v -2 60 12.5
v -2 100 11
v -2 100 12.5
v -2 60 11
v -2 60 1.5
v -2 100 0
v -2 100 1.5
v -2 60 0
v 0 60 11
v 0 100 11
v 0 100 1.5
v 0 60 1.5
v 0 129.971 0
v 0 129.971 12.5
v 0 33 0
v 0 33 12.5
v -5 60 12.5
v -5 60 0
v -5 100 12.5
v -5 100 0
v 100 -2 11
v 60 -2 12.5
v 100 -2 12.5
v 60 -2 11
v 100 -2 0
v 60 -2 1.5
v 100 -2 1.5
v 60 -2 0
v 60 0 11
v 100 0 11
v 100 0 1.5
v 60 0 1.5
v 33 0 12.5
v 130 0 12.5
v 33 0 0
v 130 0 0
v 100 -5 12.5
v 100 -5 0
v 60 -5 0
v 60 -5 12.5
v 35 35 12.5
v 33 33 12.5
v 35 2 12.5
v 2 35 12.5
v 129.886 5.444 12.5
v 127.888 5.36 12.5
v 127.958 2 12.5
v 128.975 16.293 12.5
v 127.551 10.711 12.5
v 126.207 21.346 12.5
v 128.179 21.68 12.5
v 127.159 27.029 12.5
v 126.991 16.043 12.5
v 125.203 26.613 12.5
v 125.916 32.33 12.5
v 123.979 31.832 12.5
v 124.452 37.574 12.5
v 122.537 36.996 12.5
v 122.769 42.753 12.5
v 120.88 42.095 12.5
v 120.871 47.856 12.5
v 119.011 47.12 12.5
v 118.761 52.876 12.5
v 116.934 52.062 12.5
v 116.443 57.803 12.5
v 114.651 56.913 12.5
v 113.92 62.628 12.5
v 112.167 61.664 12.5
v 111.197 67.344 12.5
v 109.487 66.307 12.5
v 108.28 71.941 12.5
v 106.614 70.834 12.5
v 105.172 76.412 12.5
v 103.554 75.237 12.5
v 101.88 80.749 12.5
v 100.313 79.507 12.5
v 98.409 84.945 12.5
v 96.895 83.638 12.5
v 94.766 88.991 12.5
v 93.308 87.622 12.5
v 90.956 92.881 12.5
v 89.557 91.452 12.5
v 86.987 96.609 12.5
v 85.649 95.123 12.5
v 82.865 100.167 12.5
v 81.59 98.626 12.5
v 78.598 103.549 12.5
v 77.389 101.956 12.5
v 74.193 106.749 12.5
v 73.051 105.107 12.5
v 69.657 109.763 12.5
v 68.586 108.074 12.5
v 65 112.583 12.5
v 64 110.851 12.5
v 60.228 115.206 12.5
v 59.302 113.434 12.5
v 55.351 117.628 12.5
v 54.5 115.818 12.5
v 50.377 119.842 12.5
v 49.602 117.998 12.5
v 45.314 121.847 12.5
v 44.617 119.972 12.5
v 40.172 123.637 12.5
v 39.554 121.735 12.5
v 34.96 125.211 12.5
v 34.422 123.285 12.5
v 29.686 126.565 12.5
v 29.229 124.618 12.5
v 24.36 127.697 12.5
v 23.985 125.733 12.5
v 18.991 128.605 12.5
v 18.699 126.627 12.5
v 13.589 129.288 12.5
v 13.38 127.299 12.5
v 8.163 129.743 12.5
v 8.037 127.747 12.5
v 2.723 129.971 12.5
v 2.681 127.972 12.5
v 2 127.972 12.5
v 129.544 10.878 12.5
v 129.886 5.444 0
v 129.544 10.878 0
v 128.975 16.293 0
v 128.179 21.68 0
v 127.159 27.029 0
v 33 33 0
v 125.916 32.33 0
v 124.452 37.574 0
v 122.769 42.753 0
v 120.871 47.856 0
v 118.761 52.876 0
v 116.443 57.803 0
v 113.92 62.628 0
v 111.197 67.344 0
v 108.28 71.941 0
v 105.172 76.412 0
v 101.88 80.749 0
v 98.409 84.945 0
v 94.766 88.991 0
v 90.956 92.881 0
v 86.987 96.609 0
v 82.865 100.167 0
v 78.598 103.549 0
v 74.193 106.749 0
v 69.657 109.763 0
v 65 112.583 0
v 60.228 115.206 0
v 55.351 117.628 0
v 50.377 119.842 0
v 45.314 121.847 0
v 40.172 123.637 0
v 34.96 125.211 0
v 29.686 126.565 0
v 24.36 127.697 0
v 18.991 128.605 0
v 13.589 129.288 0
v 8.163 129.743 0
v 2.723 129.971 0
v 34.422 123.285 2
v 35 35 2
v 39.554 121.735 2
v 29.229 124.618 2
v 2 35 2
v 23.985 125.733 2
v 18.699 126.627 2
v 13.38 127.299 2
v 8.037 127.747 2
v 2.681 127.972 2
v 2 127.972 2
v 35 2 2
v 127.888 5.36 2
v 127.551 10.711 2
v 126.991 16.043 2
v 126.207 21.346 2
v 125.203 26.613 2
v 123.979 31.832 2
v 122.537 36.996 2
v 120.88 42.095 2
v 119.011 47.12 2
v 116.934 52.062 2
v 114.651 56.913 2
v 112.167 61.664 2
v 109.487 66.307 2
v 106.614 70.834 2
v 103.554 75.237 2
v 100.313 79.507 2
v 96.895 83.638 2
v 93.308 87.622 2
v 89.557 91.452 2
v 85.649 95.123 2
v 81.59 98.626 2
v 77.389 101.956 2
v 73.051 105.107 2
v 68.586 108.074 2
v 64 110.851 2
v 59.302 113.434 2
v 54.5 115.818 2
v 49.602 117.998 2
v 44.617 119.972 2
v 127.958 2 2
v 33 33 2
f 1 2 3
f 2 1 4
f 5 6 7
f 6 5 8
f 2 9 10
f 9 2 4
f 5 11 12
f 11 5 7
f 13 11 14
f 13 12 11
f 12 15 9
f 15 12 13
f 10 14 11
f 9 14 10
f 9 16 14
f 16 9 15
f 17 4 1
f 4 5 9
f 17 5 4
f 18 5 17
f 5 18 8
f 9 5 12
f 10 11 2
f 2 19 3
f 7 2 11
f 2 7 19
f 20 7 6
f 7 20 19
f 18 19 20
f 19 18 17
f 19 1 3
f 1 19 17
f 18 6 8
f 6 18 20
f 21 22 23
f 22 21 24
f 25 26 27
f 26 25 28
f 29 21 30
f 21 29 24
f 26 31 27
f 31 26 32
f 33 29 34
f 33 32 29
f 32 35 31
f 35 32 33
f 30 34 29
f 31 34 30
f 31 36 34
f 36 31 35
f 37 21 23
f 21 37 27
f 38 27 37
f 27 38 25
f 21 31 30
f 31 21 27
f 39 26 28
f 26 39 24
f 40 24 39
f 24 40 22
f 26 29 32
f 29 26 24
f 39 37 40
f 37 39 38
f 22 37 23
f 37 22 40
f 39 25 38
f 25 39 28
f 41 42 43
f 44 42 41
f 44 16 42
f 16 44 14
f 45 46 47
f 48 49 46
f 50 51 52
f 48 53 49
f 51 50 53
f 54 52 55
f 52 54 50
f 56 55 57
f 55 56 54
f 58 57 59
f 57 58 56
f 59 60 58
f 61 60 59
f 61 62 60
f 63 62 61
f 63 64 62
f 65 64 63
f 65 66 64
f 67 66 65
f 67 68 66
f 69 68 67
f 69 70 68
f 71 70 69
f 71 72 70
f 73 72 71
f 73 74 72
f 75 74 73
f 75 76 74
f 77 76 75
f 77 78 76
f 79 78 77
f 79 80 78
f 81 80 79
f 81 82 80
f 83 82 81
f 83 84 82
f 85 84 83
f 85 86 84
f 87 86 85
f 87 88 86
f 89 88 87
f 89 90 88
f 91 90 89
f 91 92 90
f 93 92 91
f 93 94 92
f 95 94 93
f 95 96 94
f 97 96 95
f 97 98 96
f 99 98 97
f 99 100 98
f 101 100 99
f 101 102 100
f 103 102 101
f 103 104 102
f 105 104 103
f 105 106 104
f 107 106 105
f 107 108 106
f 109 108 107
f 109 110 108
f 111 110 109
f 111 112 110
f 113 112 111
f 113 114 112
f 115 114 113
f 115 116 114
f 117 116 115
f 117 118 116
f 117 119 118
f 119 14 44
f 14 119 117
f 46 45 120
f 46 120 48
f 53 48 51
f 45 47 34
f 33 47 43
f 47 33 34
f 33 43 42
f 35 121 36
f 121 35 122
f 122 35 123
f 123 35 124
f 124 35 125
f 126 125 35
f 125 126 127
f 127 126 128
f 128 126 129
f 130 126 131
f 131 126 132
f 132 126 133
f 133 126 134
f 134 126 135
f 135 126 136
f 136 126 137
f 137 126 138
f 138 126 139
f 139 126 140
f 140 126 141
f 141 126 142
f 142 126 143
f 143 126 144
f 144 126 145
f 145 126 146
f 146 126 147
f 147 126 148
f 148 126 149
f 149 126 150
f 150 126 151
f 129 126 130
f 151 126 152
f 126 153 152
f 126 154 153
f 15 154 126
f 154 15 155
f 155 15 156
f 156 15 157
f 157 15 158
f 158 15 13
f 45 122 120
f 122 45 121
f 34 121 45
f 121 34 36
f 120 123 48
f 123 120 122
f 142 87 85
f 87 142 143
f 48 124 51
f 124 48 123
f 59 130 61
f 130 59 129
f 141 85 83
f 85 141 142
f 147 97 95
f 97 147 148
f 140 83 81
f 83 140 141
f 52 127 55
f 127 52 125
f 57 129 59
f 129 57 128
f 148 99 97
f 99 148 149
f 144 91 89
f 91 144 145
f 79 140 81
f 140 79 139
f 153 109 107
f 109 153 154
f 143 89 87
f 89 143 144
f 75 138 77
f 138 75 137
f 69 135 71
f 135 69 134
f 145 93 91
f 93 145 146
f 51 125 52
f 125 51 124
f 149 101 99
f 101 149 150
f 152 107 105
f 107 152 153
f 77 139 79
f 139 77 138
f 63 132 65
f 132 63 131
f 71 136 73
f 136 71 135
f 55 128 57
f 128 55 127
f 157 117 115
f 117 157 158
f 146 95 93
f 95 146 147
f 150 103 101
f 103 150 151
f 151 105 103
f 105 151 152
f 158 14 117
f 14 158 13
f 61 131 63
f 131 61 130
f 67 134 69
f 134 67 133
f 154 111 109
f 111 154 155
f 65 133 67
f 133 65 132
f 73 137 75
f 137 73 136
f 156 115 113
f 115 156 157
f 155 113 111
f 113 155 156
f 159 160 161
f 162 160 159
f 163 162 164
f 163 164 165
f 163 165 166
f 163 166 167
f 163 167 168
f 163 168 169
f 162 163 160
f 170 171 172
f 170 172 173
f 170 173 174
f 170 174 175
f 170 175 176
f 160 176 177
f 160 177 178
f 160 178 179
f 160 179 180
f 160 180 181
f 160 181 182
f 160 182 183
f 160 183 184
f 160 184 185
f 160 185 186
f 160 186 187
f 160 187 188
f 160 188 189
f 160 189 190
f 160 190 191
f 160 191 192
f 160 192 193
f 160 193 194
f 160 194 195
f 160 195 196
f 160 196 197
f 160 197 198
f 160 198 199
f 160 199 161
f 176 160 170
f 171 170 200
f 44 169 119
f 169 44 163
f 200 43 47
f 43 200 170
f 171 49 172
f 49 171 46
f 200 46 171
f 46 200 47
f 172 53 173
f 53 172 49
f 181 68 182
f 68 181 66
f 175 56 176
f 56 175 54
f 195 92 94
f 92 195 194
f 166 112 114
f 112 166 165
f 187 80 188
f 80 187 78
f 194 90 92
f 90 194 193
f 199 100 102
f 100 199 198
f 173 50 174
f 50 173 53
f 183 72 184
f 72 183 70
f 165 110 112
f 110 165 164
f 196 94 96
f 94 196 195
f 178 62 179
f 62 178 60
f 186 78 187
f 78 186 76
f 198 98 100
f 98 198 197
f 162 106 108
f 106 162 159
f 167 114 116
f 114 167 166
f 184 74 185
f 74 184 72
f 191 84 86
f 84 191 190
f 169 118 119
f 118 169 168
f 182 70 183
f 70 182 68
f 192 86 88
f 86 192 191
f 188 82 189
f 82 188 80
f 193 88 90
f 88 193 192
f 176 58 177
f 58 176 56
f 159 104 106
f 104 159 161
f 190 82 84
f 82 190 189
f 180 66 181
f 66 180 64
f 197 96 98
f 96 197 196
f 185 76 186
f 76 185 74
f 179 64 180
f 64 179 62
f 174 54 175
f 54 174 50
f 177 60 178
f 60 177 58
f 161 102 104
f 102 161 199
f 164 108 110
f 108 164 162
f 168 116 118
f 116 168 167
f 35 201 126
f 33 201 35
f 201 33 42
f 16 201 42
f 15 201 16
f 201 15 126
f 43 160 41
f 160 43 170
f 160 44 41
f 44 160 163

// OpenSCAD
// file: bezier.scad
module line(p1,p2,w) {
    hull() {
        translate(p1) circle(r=w);
        translate(p2) circle(r=w);
    }
}
module polyline(points, index, w) {
    if(index < len(points)) {
        line(points[index - 1], points[index],w);
        polyline(points, index + 1, w);
    }
}

function choose(n, k)=
     k == 0? 1
    : (n * choose(n - 1, k - 1)) / k;

function _point_on_bezier_rec(points,t,i,c)=
    len(points) == i ? c
    : _point_on_bezier_rec(points,t,i+1,c+choose(len(points)-1,i) * pow(t,i) * pow(1-t,len(points)-i-1) * points[i]);

function _point_on_bezier(points,t)=
    _point_on_bezier_rec(points,t,0,[0,0]);

//a bezier curve with any number of control points
//parameters: 
//points - the control points of the bezier curve (number of points is variable)
//resolution - the sampling resolution of the bezier curve (number of returned points)
//returns:
//resolution number of samples on the bezier curve
function bezier(points,fn)=[
    for (t =[0:1.0/fn:1+(1/fn/2)]) _point_on_bezier(points, t)
    ];

//create a 3D rotational model with a bezier curve of given points, resolution and thickness
module bezier_model(points,resolution,thickness) {
    translate([0,0,thickness/2]) rotate_extrude() polyline(bezier(points,resolution),1,thickness/2);
}
    
// main file
print_outer = true;
print_inner = false;
use <bezier.scad>

$fn = 150;

//length and width
l = 130;
//height
h = 12.5;
//height inner
hi = 20;

//center cut out length
cl = 33;


//thickness of walls
s = 2;

//for compensate imprecise print
e = 1;

//big integer
b = 1000000;

//horizontal offset between holder
hdx = 30;

//holder width 1
hw1 = 9.5;
//holder width 2
hw2 = 12.5;
//holder length 1
hd1 = 2;
//holder length 2
hd2 = 3;
//holder zize
hl = 40;
 
module holder(hw1,hw2,hd1,hd2,hl) {
    translate([0,-hl/2,-hw1/2])cube([hd1,hl,hw1]);
    translate([hd1,-hl/2,-hw2/2]) cube([hd2,hl,hw2]);
} 



if(print_outer){
    translate([0,(l+hdx)/2,hw2/2])rotate([0,0,180])holder(hw1,hw2,hd1,hd2,hl);
    translate([(l+hdx)/2,0,hw2/2])rotate([0,0,-90])holder(hw1,hw2,hd1,hd2,hl);

    difference(){
        intersection() {
        cube([l,l,h]);
        cylinder(h,l,l);
         }
            
        intersection(){
         translate([s,s,s])cube([l-2*s,l-2*s,h]);
        cylinder(h,l-s,l-s);
        }
        
cube([cl,cl,h]);
    }
        difference(){
            cube([cl+s,cl+s,h]);
            cube([cl,cl,h]);
        }
        
}

translate([0,0,20])
if(print_inner) {
    sl = 20;
    sh=20;
    
    //border for sitting
    difference(){
    translate([0,0,hi+s+e-sh*0.65])rotate_extrude(angle=90)translate([l-s*1.5-e,0,0])polygon(bezier([[0,0],[-s/2,sh*0.6],[-sl,sh],[sl,sh],[s/2,sh*0.6],[0,0]],20));
        cube([b,s+e,b]);
        cube([s+e,b,b]);

    }







   difference(){
         intersection() {
            translate([s+e,s+e,s+e]) cube([l-2*s-e,l-2*s-e,hi]);
            translate([0,0,s+e])cylinder(hi,l-s-e,l-s-e);
         }
        intersection() {
            translate([s*2+e,s*2+e,s*2+e])cube([l-4*s-2*e,l-4*s-2*e,hi]);
            translate([0,0,s+e])cylinder(hi,l-s*2-e,l-s*2-e);
        }
        
translate([s+e,s+e,s+e]) cube([cl,cl,hi]);
    }
        translate([s+e,s+e,s+e])difference(){
            cube([cl+s,cl+s,hi]);
            cube([cl,cl,hi]);
        }
        
}
